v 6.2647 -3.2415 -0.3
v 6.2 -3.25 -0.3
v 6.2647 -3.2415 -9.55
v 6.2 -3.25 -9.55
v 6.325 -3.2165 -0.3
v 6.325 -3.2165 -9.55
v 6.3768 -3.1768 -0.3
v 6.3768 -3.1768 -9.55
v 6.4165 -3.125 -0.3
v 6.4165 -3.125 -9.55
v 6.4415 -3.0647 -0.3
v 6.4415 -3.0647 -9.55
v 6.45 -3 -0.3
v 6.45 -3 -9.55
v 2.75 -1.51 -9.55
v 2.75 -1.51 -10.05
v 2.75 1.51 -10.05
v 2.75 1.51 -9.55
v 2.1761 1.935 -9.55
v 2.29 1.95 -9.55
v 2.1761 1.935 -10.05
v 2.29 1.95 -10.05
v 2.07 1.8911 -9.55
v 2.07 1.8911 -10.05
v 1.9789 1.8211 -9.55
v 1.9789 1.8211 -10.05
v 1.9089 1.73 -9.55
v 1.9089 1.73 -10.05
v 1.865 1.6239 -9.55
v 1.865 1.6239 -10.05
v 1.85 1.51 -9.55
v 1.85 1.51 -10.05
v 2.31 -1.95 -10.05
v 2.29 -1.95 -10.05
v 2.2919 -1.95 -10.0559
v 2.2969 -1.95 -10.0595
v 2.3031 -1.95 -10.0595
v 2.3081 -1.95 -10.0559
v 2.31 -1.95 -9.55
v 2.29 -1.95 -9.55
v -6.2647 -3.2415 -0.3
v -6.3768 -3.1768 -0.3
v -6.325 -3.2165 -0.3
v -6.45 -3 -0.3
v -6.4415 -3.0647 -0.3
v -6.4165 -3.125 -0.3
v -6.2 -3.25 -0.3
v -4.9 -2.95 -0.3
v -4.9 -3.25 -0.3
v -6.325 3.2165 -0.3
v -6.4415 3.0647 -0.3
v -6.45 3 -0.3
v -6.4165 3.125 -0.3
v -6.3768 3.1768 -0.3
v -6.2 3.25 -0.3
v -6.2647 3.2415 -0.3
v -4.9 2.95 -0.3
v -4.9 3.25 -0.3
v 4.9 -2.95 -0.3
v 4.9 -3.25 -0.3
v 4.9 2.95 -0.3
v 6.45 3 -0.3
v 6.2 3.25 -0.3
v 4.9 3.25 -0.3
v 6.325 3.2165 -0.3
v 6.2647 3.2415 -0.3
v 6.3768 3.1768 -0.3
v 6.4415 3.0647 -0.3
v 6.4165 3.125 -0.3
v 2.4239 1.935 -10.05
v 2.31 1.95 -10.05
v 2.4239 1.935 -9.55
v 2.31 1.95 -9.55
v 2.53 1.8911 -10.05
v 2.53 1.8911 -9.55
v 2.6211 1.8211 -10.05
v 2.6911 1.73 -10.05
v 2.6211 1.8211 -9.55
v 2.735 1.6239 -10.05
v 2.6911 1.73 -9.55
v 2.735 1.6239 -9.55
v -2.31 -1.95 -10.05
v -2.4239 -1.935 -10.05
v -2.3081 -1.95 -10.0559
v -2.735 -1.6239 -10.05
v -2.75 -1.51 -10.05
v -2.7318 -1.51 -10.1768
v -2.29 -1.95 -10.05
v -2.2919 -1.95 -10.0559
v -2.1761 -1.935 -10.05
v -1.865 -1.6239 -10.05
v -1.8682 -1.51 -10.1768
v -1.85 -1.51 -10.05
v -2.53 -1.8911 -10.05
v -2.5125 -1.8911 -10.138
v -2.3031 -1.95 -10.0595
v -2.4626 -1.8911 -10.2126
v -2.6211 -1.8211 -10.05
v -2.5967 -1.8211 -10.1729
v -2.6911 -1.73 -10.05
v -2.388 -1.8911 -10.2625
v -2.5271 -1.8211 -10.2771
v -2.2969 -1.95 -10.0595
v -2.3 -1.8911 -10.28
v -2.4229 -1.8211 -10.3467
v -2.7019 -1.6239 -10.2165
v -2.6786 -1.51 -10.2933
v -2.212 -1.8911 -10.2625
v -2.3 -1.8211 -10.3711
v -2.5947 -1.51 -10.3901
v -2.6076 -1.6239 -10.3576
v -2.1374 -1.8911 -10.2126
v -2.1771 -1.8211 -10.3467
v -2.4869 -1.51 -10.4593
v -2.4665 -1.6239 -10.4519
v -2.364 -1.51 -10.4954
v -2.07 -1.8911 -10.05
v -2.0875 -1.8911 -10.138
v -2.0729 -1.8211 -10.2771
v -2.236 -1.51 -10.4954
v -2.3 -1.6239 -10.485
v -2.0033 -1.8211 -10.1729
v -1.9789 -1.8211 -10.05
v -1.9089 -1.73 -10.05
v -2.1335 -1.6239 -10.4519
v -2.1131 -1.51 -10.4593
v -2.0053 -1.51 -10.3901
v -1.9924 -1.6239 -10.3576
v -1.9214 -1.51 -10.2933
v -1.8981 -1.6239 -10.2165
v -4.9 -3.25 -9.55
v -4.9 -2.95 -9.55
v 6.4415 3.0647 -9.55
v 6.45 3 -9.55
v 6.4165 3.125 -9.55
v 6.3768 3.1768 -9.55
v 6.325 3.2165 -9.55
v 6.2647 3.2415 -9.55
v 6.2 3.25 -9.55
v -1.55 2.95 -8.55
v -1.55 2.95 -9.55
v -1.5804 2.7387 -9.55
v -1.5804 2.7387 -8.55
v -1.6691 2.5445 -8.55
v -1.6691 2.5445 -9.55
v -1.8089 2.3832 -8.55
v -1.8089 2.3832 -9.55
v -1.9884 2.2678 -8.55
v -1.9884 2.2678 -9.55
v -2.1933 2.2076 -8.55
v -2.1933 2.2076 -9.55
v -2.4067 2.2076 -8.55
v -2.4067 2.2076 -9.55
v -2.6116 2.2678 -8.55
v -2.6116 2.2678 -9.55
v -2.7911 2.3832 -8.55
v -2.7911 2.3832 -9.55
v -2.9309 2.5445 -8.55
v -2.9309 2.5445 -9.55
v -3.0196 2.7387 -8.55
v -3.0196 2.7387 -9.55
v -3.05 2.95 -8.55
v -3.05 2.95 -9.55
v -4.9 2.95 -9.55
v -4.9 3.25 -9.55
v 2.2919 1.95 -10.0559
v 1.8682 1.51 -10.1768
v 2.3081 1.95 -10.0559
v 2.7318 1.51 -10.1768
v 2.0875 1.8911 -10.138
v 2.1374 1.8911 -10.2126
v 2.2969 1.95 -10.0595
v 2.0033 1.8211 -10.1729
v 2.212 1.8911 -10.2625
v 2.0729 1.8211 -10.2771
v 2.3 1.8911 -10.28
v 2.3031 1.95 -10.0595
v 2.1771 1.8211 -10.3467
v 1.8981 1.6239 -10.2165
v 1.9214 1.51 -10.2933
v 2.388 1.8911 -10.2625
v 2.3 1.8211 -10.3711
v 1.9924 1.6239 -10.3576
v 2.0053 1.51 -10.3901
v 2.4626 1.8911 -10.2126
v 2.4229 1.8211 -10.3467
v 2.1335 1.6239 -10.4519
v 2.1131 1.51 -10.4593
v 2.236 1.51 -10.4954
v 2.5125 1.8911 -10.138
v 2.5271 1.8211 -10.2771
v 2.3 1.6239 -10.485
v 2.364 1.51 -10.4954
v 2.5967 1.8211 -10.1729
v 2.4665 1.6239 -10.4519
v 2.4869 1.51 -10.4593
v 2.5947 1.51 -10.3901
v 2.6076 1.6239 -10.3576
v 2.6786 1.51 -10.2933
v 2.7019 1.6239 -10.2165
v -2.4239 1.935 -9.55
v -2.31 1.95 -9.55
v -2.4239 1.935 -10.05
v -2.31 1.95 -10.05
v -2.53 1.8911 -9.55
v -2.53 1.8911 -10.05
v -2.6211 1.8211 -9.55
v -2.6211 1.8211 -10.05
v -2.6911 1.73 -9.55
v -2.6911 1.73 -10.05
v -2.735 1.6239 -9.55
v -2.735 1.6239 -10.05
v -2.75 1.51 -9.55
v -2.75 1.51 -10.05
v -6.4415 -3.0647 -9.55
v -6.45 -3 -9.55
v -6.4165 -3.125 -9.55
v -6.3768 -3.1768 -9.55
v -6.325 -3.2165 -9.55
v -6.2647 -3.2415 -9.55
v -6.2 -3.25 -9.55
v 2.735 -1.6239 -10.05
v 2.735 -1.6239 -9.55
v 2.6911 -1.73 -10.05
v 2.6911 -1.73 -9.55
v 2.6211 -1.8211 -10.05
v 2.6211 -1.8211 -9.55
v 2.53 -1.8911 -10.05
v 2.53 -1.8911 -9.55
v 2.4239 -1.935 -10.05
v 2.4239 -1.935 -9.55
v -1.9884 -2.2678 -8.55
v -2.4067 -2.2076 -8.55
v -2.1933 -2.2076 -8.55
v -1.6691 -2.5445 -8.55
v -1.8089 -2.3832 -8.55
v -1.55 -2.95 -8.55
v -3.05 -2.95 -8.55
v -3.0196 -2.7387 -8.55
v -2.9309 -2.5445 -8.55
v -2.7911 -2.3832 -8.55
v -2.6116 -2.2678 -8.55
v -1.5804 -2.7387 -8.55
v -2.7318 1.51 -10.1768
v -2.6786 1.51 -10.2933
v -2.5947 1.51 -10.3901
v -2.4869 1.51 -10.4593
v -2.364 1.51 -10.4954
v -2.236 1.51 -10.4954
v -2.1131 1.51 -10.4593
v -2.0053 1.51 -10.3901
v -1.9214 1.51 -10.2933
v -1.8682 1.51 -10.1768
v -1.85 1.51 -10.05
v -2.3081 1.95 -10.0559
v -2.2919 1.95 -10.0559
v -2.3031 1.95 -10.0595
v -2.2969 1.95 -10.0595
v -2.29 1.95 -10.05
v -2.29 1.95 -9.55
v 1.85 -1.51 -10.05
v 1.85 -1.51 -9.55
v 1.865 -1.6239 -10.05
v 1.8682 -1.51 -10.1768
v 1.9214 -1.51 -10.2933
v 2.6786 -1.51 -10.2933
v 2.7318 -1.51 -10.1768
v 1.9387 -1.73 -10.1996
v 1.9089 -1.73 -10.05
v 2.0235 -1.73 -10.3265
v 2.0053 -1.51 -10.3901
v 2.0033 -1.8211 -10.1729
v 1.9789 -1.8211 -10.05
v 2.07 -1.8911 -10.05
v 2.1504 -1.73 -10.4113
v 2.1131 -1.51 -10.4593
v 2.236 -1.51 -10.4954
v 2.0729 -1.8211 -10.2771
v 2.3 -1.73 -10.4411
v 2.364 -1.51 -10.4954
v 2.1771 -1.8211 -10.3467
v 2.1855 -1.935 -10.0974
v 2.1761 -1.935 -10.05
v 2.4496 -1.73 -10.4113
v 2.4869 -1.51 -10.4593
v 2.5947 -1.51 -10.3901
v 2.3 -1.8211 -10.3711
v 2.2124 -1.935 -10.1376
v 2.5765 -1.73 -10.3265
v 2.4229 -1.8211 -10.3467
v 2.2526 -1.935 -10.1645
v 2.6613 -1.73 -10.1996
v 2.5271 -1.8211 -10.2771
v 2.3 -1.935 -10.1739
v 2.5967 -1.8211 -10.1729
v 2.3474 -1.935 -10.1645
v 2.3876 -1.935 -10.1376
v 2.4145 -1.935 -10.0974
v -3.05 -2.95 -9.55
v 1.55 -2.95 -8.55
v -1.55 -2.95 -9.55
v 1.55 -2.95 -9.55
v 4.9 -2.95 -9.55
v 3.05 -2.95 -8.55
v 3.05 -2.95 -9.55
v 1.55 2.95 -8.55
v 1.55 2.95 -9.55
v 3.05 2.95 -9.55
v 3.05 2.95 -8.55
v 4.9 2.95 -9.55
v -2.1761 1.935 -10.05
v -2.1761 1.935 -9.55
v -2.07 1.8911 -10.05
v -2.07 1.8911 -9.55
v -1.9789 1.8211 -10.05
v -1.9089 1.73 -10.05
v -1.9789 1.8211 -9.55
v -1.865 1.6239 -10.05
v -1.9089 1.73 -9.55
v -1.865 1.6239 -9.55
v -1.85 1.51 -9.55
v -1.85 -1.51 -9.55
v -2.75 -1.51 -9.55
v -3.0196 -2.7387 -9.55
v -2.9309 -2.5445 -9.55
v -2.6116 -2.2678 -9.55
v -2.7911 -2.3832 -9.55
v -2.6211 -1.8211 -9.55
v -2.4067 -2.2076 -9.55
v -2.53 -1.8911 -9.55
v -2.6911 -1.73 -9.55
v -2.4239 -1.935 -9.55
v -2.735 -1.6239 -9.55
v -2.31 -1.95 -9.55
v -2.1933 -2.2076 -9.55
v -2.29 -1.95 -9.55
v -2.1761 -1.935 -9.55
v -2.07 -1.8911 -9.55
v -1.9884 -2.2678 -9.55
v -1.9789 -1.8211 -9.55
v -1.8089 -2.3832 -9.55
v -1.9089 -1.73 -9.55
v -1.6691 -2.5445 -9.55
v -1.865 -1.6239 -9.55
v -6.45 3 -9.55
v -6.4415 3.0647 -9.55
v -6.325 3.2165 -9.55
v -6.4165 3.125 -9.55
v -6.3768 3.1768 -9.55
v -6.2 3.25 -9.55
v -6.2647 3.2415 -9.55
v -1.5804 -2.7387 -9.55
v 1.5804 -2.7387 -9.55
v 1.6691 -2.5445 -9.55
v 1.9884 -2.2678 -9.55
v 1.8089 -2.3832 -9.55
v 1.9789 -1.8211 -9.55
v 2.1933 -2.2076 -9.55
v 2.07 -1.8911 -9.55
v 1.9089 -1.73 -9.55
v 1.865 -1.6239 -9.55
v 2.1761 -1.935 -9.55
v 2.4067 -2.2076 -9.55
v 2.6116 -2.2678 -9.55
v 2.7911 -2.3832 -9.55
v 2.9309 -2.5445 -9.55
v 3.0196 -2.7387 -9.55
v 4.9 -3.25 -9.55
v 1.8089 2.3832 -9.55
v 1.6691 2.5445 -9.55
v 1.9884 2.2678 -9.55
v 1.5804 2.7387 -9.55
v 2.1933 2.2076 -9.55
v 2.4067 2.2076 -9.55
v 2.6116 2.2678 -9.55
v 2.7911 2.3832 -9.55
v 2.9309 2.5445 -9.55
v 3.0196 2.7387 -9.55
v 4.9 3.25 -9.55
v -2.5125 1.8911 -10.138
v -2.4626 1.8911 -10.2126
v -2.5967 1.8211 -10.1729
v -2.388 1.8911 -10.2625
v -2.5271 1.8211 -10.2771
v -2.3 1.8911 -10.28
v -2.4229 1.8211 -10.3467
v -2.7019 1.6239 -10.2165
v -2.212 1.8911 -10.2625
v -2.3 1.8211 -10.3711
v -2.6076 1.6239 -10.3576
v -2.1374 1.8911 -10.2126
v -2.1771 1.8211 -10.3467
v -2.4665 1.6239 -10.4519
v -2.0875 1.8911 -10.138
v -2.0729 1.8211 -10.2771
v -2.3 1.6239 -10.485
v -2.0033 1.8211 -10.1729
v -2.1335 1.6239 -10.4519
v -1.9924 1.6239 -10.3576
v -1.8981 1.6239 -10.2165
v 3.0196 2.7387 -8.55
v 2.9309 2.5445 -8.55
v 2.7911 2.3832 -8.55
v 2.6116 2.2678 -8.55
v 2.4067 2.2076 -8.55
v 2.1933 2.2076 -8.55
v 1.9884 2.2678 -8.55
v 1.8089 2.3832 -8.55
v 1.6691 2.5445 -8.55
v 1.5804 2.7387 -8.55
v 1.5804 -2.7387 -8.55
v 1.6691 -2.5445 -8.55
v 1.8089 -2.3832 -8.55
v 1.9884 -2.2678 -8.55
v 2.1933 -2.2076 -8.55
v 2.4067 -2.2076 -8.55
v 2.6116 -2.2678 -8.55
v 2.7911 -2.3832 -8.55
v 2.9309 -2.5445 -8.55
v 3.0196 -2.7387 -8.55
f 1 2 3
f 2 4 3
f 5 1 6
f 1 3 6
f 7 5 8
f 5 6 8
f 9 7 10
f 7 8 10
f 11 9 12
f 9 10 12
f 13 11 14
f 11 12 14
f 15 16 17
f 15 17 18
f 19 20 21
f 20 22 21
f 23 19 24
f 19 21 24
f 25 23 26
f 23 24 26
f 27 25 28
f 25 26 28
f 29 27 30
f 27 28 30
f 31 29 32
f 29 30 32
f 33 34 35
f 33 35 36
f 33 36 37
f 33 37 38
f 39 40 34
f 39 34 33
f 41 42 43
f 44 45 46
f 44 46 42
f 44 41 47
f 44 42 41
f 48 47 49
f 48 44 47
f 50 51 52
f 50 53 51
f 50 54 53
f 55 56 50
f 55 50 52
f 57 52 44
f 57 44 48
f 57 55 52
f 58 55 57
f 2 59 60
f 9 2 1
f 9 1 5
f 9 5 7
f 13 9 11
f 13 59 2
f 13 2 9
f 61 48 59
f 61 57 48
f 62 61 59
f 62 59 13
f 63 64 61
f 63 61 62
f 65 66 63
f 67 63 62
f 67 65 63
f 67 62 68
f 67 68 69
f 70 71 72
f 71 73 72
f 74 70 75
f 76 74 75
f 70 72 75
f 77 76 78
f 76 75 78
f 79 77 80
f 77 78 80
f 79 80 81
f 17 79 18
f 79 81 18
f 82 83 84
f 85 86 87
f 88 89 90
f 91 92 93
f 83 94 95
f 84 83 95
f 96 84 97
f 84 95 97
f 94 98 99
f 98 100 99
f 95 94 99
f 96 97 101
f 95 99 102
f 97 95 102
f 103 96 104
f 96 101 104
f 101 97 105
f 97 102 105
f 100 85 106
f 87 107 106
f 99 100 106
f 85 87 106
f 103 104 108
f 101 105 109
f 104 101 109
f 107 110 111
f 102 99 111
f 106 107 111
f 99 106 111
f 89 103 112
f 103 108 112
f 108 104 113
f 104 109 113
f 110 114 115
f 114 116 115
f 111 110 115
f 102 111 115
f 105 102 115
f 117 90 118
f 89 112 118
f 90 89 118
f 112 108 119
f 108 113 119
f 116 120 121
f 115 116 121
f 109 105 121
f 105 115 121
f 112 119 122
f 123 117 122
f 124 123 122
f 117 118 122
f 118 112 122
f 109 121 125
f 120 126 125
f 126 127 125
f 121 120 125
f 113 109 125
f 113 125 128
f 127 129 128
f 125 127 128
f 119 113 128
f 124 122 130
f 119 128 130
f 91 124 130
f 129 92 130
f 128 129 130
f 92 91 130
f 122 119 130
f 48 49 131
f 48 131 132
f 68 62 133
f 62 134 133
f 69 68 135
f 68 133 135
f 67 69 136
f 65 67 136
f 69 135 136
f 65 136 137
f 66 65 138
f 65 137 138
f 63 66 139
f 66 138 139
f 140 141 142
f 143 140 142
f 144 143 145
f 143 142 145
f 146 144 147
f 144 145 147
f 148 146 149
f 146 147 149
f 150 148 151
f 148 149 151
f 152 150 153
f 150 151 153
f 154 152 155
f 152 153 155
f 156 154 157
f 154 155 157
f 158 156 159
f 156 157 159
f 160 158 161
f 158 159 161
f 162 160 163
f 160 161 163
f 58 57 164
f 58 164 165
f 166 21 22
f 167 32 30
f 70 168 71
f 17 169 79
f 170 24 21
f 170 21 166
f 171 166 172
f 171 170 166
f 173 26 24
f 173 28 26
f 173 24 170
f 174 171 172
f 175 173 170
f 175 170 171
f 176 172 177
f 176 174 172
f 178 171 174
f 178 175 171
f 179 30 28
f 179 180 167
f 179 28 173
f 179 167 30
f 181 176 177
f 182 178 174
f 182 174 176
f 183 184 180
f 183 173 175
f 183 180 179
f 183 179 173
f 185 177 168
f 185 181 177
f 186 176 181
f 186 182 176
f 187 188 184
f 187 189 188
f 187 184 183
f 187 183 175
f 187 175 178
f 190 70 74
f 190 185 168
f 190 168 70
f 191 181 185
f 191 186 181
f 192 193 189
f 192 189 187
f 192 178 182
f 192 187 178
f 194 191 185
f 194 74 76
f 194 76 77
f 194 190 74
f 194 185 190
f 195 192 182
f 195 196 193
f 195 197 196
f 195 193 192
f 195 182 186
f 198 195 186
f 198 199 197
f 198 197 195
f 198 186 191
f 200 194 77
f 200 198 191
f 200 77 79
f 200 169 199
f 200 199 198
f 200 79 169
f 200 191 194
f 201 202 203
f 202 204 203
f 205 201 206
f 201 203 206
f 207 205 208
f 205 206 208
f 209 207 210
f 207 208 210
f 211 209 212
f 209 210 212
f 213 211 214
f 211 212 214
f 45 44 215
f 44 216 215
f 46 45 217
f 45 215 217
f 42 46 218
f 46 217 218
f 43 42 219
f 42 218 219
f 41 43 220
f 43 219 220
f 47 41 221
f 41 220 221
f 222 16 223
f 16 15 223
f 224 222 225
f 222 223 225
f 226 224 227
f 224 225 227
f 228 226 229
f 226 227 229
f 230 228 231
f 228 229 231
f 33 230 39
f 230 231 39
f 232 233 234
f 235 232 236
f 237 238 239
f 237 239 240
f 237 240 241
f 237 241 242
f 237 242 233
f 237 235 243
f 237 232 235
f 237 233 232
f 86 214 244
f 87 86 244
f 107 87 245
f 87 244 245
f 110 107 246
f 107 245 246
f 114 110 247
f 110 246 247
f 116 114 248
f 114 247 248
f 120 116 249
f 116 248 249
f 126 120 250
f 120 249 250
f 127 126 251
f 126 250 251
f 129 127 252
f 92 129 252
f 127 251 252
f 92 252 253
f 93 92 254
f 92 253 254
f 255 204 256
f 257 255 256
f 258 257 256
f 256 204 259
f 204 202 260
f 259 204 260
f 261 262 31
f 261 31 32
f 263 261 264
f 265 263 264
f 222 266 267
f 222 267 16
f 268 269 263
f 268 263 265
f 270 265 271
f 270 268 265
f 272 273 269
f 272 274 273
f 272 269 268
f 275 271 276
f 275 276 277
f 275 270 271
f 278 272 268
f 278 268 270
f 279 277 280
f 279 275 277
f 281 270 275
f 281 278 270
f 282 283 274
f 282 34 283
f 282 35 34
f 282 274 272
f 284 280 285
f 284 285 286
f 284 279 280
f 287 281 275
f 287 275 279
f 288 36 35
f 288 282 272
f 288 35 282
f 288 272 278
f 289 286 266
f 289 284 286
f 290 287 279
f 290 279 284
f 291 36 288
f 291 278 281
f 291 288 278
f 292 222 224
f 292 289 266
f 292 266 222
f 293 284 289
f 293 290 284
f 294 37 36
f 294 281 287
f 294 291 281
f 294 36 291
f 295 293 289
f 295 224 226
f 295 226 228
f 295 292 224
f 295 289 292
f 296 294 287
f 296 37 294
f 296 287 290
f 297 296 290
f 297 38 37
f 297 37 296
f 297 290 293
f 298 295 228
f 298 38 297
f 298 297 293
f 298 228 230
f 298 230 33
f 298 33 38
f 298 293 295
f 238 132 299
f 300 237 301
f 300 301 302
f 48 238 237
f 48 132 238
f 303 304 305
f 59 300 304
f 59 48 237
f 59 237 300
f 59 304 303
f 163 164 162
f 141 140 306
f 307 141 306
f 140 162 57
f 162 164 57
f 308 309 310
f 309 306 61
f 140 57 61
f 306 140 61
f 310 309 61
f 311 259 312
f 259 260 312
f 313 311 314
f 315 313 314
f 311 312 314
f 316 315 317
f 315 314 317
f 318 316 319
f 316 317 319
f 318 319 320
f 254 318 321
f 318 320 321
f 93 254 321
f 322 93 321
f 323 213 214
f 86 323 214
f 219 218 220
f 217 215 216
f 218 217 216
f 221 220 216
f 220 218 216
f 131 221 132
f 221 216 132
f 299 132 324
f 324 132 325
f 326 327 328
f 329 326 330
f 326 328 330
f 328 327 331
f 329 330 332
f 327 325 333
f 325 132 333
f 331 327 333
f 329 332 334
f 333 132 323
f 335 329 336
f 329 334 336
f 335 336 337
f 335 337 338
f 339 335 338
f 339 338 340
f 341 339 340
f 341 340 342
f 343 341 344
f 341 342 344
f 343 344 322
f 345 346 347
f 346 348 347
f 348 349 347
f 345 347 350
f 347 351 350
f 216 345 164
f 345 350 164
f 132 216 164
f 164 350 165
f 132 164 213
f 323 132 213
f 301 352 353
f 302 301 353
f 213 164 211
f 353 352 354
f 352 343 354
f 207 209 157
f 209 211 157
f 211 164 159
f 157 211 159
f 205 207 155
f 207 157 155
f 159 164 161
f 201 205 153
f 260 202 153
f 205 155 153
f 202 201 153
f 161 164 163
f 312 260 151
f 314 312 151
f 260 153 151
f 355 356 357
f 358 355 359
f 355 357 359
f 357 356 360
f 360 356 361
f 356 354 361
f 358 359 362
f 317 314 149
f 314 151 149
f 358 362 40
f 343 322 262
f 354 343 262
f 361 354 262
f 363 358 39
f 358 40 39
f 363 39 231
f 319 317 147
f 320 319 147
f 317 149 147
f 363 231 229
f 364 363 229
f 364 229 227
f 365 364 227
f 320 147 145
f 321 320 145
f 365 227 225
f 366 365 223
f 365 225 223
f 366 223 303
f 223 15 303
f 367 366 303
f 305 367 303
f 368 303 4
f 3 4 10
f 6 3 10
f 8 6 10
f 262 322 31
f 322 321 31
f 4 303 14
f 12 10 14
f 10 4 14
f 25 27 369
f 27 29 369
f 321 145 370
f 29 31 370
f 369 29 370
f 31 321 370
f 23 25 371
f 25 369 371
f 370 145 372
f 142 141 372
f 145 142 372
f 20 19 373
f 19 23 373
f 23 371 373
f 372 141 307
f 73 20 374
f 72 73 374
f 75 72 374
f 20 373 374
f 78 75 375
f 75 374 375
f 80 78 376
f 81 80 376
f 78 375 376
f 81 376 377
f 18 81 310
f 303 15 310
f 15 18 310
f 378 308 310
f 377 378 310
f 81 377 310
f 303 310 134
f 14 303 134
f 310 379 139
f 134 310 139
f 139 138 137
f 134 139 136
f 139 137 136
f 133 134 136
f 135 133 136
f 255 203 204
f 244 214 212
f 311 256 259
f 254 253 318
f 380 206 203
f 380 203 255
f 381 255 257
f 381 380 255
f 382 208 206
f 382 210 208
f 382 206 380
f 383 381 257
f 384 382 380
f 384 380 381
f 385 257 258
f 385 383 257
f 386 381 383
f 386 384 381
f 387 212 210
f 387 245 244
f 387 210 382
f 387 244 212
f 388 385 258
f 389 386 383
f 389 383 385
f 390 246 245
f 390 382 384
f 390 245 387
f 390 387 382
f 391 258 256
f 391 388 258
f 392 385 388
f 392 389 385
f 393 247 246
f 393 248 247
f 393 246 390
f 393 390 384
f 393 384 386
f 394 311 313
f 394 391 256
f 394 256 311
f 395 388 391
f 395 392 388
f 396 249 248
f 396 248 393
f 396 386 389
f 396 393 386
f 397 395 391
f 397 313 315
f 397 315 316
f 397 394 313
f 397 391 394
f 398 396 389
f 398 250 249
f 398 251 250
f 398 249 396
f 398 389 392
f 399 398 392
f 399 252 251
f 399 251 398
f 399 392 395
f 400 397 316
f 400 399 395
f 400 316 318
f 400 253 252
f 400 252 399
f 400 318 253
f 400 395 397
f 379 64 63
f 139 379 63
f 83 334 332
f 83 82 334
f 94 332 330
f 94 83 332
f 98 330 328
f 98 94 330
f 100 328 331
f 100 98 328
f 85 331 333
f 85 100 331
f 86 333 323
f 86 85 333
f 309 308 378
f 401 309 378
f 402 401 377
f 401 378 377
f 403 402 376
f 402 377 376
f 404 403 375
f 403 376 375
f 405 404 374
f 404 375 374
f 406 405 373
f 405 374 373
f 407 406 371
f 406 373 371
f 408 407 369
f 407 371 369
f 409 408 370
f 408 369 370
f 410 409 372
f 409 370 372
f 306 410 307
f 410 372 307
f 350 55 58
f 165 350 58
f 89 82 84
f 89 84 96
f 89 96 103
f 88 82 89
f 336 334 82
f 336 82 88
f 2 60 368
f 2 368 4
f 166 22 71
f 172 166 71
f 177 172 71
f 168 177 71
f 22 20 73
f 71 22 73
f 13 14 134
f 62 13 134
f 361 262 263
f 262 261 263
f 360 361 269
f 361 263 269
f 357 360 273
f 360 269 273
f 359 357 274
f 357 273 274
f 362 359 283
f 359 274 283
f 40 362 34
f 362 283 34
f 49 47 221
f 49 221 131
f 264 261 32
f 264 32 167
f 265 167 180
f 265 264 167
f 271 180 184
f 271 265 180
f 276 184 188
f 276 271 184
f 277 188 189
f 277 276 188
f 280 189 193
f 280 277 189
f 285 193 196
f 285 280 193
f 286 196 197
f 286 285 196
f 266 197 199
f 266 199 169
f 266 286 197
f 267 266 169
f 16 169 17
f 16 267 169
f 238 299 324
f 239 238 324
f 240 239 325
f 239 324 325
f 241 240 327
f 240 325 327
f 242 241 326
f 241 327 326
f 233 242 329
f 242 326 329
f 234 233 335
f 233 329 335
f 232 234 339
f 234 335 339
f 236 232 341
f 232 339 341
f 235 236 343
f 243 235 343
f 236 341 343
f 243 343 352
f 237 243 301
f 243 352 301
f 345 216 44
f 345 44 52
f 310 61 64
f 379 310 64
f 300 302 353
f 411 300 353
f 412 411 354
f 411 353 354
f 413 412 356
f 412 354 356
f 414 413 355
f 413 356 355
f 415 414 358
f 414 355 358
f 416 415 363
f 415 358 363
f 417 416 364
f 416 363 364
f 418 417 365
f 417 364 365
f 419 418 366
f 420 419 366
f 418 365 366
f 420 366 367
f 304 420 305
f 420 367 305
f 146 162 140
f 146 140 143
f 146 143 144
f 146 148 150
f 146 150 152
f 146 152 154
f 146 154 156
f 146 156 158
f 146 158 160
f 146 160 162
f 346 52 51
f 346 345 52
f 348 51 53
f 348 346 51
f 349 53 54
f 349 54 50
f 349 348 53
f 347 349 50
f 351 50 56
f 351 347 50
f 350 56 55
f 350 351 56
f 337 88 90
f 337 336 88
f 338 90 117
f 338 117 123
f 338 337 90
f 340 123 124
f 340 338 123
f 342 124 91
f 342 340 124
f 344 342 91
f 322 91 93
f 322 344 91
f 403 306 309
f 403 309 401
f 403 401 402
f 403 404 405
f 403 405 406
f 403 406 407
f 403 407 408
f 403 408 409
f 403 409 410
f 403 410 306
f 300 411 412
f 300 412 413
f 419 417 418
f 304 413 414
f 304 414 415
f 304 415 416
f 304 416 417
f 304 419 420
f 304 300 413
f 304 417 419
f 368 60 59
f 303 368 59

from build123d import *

# Parameters (mm, degrees)
SKETCH_W        = 12.9
SKETCH_H        = 6.5
PAD_DEPTH       = 9.25
FILLET_R        = 0.25
SKETCH001_W     = 9.8
SKETCH001_H     = 0.3
POCKET_DEPTH    = 9.251
SKETCH002_R     = 0.75
POCKET001_DEPTH = 1
PAD001_DEPTH    = 1.95
FILLET001_R     = 0.44


with BuildPart() as part:
    # Sketch → Pad (new body)
    with BuildSketch(Plane.XY):
        Rectangle(SKETCH_W, SKETCH_H)
    extrude(amount=-PAD_DEPTH)

    # Fillet
    fillet_edges = [part.edges().sort_by_distance(p)[0] for p in [
        (6.45, -3.25, -4.625),
        (-6.45, -3.25, -4.625),
        (-6.45, 3.25, -4.625),
        (6.45, 3.25, -4.625),
    ]]
    fillet(fillet_edges, radius=FILLET_R)

    # Sketch001 (on Face2 of Fillet) → Pocket (cut, through all)
    with BuildSketch(Plane.XY):
        with Locations((0, -3.1)):
            Rectangle(SKETCH001_W, SKETCH001_H)
        with Locations((0, 3.1)):
            Rectangle(SKETCH001_W, SKETCH001_H)
    extrude(amount=-POCKET_DEPTH, mode=Mode.SUBTRACT)

    # Sketch002 (on Face4 of Pocket) → Pocket001 (cut)
    with BuildSketch(Plane(origin=(0, 0, -9.25), x_dir=(1, 0, 0), z_dir=(0, 0, -1))):
        with Locations((-2.3, 2.95)):
            Circle(SKETCH002_R)
        with Locations((2.3, 2.95)):
            Circle(SKETCH002_R)
        with Locations((-2.3, -2.95)):
            Circle(SKETCH002_R)
        with Locations((2.3, -2.95)):
            Circle(SKETCH002_R)
    extrude(amount=-POCKET001_DEPTH, mode=Mode.SUBTRACT)

    # Sketch003 → Pad001 (join, symmetric)
    with BuildSketch(Plane.XZ):
        with BuildLine():
            ThreePointArc((-1.85, -9.25), (-2.3, -8.8), (-2.75, -9.25))
            Line((-2.75, -9.25), (-2.75, -9.75))
            ThreePointArc((-2.75, -9.75), (-2.3, -10.2), (-1.85, -9.75))
            Line((-1.85, -9.75), (-1.85, -9.25))
        make_face()
        with BuildLine():
            ThreePointArc((2.75, -9.25), (2.3, -8.8), (1.85, -9.25))
            Line((1.85, -9.25), (1.85, -9.75))
            ThreePointArc((1.85, -9.75), (2.3, -10.2), (2.75, -9.75))
            Line((2.75, -9.75), (2.75, -9.25))
        make_face()
    extrude(amount=PAD001_DEPTH, both=True)

    # Fillet001
    fillet001_edges = [part.edges().sort_by_distance(p)[0] for p in [
        (-2.3, 1.95, -10.2),
        (2.3, 1.95, -10.2),
        (2.3, -1.95, -10.2),
        (-2.3, -1.95, -10.2),
    ]]
    fillet(fillet001_edges, radius=FILLET001_R)


with BuildPart() as part_1:
    # Body placement: moved
    add(part.part.moved(Location((0, 0, -0.3))))


solid = part_1.part
